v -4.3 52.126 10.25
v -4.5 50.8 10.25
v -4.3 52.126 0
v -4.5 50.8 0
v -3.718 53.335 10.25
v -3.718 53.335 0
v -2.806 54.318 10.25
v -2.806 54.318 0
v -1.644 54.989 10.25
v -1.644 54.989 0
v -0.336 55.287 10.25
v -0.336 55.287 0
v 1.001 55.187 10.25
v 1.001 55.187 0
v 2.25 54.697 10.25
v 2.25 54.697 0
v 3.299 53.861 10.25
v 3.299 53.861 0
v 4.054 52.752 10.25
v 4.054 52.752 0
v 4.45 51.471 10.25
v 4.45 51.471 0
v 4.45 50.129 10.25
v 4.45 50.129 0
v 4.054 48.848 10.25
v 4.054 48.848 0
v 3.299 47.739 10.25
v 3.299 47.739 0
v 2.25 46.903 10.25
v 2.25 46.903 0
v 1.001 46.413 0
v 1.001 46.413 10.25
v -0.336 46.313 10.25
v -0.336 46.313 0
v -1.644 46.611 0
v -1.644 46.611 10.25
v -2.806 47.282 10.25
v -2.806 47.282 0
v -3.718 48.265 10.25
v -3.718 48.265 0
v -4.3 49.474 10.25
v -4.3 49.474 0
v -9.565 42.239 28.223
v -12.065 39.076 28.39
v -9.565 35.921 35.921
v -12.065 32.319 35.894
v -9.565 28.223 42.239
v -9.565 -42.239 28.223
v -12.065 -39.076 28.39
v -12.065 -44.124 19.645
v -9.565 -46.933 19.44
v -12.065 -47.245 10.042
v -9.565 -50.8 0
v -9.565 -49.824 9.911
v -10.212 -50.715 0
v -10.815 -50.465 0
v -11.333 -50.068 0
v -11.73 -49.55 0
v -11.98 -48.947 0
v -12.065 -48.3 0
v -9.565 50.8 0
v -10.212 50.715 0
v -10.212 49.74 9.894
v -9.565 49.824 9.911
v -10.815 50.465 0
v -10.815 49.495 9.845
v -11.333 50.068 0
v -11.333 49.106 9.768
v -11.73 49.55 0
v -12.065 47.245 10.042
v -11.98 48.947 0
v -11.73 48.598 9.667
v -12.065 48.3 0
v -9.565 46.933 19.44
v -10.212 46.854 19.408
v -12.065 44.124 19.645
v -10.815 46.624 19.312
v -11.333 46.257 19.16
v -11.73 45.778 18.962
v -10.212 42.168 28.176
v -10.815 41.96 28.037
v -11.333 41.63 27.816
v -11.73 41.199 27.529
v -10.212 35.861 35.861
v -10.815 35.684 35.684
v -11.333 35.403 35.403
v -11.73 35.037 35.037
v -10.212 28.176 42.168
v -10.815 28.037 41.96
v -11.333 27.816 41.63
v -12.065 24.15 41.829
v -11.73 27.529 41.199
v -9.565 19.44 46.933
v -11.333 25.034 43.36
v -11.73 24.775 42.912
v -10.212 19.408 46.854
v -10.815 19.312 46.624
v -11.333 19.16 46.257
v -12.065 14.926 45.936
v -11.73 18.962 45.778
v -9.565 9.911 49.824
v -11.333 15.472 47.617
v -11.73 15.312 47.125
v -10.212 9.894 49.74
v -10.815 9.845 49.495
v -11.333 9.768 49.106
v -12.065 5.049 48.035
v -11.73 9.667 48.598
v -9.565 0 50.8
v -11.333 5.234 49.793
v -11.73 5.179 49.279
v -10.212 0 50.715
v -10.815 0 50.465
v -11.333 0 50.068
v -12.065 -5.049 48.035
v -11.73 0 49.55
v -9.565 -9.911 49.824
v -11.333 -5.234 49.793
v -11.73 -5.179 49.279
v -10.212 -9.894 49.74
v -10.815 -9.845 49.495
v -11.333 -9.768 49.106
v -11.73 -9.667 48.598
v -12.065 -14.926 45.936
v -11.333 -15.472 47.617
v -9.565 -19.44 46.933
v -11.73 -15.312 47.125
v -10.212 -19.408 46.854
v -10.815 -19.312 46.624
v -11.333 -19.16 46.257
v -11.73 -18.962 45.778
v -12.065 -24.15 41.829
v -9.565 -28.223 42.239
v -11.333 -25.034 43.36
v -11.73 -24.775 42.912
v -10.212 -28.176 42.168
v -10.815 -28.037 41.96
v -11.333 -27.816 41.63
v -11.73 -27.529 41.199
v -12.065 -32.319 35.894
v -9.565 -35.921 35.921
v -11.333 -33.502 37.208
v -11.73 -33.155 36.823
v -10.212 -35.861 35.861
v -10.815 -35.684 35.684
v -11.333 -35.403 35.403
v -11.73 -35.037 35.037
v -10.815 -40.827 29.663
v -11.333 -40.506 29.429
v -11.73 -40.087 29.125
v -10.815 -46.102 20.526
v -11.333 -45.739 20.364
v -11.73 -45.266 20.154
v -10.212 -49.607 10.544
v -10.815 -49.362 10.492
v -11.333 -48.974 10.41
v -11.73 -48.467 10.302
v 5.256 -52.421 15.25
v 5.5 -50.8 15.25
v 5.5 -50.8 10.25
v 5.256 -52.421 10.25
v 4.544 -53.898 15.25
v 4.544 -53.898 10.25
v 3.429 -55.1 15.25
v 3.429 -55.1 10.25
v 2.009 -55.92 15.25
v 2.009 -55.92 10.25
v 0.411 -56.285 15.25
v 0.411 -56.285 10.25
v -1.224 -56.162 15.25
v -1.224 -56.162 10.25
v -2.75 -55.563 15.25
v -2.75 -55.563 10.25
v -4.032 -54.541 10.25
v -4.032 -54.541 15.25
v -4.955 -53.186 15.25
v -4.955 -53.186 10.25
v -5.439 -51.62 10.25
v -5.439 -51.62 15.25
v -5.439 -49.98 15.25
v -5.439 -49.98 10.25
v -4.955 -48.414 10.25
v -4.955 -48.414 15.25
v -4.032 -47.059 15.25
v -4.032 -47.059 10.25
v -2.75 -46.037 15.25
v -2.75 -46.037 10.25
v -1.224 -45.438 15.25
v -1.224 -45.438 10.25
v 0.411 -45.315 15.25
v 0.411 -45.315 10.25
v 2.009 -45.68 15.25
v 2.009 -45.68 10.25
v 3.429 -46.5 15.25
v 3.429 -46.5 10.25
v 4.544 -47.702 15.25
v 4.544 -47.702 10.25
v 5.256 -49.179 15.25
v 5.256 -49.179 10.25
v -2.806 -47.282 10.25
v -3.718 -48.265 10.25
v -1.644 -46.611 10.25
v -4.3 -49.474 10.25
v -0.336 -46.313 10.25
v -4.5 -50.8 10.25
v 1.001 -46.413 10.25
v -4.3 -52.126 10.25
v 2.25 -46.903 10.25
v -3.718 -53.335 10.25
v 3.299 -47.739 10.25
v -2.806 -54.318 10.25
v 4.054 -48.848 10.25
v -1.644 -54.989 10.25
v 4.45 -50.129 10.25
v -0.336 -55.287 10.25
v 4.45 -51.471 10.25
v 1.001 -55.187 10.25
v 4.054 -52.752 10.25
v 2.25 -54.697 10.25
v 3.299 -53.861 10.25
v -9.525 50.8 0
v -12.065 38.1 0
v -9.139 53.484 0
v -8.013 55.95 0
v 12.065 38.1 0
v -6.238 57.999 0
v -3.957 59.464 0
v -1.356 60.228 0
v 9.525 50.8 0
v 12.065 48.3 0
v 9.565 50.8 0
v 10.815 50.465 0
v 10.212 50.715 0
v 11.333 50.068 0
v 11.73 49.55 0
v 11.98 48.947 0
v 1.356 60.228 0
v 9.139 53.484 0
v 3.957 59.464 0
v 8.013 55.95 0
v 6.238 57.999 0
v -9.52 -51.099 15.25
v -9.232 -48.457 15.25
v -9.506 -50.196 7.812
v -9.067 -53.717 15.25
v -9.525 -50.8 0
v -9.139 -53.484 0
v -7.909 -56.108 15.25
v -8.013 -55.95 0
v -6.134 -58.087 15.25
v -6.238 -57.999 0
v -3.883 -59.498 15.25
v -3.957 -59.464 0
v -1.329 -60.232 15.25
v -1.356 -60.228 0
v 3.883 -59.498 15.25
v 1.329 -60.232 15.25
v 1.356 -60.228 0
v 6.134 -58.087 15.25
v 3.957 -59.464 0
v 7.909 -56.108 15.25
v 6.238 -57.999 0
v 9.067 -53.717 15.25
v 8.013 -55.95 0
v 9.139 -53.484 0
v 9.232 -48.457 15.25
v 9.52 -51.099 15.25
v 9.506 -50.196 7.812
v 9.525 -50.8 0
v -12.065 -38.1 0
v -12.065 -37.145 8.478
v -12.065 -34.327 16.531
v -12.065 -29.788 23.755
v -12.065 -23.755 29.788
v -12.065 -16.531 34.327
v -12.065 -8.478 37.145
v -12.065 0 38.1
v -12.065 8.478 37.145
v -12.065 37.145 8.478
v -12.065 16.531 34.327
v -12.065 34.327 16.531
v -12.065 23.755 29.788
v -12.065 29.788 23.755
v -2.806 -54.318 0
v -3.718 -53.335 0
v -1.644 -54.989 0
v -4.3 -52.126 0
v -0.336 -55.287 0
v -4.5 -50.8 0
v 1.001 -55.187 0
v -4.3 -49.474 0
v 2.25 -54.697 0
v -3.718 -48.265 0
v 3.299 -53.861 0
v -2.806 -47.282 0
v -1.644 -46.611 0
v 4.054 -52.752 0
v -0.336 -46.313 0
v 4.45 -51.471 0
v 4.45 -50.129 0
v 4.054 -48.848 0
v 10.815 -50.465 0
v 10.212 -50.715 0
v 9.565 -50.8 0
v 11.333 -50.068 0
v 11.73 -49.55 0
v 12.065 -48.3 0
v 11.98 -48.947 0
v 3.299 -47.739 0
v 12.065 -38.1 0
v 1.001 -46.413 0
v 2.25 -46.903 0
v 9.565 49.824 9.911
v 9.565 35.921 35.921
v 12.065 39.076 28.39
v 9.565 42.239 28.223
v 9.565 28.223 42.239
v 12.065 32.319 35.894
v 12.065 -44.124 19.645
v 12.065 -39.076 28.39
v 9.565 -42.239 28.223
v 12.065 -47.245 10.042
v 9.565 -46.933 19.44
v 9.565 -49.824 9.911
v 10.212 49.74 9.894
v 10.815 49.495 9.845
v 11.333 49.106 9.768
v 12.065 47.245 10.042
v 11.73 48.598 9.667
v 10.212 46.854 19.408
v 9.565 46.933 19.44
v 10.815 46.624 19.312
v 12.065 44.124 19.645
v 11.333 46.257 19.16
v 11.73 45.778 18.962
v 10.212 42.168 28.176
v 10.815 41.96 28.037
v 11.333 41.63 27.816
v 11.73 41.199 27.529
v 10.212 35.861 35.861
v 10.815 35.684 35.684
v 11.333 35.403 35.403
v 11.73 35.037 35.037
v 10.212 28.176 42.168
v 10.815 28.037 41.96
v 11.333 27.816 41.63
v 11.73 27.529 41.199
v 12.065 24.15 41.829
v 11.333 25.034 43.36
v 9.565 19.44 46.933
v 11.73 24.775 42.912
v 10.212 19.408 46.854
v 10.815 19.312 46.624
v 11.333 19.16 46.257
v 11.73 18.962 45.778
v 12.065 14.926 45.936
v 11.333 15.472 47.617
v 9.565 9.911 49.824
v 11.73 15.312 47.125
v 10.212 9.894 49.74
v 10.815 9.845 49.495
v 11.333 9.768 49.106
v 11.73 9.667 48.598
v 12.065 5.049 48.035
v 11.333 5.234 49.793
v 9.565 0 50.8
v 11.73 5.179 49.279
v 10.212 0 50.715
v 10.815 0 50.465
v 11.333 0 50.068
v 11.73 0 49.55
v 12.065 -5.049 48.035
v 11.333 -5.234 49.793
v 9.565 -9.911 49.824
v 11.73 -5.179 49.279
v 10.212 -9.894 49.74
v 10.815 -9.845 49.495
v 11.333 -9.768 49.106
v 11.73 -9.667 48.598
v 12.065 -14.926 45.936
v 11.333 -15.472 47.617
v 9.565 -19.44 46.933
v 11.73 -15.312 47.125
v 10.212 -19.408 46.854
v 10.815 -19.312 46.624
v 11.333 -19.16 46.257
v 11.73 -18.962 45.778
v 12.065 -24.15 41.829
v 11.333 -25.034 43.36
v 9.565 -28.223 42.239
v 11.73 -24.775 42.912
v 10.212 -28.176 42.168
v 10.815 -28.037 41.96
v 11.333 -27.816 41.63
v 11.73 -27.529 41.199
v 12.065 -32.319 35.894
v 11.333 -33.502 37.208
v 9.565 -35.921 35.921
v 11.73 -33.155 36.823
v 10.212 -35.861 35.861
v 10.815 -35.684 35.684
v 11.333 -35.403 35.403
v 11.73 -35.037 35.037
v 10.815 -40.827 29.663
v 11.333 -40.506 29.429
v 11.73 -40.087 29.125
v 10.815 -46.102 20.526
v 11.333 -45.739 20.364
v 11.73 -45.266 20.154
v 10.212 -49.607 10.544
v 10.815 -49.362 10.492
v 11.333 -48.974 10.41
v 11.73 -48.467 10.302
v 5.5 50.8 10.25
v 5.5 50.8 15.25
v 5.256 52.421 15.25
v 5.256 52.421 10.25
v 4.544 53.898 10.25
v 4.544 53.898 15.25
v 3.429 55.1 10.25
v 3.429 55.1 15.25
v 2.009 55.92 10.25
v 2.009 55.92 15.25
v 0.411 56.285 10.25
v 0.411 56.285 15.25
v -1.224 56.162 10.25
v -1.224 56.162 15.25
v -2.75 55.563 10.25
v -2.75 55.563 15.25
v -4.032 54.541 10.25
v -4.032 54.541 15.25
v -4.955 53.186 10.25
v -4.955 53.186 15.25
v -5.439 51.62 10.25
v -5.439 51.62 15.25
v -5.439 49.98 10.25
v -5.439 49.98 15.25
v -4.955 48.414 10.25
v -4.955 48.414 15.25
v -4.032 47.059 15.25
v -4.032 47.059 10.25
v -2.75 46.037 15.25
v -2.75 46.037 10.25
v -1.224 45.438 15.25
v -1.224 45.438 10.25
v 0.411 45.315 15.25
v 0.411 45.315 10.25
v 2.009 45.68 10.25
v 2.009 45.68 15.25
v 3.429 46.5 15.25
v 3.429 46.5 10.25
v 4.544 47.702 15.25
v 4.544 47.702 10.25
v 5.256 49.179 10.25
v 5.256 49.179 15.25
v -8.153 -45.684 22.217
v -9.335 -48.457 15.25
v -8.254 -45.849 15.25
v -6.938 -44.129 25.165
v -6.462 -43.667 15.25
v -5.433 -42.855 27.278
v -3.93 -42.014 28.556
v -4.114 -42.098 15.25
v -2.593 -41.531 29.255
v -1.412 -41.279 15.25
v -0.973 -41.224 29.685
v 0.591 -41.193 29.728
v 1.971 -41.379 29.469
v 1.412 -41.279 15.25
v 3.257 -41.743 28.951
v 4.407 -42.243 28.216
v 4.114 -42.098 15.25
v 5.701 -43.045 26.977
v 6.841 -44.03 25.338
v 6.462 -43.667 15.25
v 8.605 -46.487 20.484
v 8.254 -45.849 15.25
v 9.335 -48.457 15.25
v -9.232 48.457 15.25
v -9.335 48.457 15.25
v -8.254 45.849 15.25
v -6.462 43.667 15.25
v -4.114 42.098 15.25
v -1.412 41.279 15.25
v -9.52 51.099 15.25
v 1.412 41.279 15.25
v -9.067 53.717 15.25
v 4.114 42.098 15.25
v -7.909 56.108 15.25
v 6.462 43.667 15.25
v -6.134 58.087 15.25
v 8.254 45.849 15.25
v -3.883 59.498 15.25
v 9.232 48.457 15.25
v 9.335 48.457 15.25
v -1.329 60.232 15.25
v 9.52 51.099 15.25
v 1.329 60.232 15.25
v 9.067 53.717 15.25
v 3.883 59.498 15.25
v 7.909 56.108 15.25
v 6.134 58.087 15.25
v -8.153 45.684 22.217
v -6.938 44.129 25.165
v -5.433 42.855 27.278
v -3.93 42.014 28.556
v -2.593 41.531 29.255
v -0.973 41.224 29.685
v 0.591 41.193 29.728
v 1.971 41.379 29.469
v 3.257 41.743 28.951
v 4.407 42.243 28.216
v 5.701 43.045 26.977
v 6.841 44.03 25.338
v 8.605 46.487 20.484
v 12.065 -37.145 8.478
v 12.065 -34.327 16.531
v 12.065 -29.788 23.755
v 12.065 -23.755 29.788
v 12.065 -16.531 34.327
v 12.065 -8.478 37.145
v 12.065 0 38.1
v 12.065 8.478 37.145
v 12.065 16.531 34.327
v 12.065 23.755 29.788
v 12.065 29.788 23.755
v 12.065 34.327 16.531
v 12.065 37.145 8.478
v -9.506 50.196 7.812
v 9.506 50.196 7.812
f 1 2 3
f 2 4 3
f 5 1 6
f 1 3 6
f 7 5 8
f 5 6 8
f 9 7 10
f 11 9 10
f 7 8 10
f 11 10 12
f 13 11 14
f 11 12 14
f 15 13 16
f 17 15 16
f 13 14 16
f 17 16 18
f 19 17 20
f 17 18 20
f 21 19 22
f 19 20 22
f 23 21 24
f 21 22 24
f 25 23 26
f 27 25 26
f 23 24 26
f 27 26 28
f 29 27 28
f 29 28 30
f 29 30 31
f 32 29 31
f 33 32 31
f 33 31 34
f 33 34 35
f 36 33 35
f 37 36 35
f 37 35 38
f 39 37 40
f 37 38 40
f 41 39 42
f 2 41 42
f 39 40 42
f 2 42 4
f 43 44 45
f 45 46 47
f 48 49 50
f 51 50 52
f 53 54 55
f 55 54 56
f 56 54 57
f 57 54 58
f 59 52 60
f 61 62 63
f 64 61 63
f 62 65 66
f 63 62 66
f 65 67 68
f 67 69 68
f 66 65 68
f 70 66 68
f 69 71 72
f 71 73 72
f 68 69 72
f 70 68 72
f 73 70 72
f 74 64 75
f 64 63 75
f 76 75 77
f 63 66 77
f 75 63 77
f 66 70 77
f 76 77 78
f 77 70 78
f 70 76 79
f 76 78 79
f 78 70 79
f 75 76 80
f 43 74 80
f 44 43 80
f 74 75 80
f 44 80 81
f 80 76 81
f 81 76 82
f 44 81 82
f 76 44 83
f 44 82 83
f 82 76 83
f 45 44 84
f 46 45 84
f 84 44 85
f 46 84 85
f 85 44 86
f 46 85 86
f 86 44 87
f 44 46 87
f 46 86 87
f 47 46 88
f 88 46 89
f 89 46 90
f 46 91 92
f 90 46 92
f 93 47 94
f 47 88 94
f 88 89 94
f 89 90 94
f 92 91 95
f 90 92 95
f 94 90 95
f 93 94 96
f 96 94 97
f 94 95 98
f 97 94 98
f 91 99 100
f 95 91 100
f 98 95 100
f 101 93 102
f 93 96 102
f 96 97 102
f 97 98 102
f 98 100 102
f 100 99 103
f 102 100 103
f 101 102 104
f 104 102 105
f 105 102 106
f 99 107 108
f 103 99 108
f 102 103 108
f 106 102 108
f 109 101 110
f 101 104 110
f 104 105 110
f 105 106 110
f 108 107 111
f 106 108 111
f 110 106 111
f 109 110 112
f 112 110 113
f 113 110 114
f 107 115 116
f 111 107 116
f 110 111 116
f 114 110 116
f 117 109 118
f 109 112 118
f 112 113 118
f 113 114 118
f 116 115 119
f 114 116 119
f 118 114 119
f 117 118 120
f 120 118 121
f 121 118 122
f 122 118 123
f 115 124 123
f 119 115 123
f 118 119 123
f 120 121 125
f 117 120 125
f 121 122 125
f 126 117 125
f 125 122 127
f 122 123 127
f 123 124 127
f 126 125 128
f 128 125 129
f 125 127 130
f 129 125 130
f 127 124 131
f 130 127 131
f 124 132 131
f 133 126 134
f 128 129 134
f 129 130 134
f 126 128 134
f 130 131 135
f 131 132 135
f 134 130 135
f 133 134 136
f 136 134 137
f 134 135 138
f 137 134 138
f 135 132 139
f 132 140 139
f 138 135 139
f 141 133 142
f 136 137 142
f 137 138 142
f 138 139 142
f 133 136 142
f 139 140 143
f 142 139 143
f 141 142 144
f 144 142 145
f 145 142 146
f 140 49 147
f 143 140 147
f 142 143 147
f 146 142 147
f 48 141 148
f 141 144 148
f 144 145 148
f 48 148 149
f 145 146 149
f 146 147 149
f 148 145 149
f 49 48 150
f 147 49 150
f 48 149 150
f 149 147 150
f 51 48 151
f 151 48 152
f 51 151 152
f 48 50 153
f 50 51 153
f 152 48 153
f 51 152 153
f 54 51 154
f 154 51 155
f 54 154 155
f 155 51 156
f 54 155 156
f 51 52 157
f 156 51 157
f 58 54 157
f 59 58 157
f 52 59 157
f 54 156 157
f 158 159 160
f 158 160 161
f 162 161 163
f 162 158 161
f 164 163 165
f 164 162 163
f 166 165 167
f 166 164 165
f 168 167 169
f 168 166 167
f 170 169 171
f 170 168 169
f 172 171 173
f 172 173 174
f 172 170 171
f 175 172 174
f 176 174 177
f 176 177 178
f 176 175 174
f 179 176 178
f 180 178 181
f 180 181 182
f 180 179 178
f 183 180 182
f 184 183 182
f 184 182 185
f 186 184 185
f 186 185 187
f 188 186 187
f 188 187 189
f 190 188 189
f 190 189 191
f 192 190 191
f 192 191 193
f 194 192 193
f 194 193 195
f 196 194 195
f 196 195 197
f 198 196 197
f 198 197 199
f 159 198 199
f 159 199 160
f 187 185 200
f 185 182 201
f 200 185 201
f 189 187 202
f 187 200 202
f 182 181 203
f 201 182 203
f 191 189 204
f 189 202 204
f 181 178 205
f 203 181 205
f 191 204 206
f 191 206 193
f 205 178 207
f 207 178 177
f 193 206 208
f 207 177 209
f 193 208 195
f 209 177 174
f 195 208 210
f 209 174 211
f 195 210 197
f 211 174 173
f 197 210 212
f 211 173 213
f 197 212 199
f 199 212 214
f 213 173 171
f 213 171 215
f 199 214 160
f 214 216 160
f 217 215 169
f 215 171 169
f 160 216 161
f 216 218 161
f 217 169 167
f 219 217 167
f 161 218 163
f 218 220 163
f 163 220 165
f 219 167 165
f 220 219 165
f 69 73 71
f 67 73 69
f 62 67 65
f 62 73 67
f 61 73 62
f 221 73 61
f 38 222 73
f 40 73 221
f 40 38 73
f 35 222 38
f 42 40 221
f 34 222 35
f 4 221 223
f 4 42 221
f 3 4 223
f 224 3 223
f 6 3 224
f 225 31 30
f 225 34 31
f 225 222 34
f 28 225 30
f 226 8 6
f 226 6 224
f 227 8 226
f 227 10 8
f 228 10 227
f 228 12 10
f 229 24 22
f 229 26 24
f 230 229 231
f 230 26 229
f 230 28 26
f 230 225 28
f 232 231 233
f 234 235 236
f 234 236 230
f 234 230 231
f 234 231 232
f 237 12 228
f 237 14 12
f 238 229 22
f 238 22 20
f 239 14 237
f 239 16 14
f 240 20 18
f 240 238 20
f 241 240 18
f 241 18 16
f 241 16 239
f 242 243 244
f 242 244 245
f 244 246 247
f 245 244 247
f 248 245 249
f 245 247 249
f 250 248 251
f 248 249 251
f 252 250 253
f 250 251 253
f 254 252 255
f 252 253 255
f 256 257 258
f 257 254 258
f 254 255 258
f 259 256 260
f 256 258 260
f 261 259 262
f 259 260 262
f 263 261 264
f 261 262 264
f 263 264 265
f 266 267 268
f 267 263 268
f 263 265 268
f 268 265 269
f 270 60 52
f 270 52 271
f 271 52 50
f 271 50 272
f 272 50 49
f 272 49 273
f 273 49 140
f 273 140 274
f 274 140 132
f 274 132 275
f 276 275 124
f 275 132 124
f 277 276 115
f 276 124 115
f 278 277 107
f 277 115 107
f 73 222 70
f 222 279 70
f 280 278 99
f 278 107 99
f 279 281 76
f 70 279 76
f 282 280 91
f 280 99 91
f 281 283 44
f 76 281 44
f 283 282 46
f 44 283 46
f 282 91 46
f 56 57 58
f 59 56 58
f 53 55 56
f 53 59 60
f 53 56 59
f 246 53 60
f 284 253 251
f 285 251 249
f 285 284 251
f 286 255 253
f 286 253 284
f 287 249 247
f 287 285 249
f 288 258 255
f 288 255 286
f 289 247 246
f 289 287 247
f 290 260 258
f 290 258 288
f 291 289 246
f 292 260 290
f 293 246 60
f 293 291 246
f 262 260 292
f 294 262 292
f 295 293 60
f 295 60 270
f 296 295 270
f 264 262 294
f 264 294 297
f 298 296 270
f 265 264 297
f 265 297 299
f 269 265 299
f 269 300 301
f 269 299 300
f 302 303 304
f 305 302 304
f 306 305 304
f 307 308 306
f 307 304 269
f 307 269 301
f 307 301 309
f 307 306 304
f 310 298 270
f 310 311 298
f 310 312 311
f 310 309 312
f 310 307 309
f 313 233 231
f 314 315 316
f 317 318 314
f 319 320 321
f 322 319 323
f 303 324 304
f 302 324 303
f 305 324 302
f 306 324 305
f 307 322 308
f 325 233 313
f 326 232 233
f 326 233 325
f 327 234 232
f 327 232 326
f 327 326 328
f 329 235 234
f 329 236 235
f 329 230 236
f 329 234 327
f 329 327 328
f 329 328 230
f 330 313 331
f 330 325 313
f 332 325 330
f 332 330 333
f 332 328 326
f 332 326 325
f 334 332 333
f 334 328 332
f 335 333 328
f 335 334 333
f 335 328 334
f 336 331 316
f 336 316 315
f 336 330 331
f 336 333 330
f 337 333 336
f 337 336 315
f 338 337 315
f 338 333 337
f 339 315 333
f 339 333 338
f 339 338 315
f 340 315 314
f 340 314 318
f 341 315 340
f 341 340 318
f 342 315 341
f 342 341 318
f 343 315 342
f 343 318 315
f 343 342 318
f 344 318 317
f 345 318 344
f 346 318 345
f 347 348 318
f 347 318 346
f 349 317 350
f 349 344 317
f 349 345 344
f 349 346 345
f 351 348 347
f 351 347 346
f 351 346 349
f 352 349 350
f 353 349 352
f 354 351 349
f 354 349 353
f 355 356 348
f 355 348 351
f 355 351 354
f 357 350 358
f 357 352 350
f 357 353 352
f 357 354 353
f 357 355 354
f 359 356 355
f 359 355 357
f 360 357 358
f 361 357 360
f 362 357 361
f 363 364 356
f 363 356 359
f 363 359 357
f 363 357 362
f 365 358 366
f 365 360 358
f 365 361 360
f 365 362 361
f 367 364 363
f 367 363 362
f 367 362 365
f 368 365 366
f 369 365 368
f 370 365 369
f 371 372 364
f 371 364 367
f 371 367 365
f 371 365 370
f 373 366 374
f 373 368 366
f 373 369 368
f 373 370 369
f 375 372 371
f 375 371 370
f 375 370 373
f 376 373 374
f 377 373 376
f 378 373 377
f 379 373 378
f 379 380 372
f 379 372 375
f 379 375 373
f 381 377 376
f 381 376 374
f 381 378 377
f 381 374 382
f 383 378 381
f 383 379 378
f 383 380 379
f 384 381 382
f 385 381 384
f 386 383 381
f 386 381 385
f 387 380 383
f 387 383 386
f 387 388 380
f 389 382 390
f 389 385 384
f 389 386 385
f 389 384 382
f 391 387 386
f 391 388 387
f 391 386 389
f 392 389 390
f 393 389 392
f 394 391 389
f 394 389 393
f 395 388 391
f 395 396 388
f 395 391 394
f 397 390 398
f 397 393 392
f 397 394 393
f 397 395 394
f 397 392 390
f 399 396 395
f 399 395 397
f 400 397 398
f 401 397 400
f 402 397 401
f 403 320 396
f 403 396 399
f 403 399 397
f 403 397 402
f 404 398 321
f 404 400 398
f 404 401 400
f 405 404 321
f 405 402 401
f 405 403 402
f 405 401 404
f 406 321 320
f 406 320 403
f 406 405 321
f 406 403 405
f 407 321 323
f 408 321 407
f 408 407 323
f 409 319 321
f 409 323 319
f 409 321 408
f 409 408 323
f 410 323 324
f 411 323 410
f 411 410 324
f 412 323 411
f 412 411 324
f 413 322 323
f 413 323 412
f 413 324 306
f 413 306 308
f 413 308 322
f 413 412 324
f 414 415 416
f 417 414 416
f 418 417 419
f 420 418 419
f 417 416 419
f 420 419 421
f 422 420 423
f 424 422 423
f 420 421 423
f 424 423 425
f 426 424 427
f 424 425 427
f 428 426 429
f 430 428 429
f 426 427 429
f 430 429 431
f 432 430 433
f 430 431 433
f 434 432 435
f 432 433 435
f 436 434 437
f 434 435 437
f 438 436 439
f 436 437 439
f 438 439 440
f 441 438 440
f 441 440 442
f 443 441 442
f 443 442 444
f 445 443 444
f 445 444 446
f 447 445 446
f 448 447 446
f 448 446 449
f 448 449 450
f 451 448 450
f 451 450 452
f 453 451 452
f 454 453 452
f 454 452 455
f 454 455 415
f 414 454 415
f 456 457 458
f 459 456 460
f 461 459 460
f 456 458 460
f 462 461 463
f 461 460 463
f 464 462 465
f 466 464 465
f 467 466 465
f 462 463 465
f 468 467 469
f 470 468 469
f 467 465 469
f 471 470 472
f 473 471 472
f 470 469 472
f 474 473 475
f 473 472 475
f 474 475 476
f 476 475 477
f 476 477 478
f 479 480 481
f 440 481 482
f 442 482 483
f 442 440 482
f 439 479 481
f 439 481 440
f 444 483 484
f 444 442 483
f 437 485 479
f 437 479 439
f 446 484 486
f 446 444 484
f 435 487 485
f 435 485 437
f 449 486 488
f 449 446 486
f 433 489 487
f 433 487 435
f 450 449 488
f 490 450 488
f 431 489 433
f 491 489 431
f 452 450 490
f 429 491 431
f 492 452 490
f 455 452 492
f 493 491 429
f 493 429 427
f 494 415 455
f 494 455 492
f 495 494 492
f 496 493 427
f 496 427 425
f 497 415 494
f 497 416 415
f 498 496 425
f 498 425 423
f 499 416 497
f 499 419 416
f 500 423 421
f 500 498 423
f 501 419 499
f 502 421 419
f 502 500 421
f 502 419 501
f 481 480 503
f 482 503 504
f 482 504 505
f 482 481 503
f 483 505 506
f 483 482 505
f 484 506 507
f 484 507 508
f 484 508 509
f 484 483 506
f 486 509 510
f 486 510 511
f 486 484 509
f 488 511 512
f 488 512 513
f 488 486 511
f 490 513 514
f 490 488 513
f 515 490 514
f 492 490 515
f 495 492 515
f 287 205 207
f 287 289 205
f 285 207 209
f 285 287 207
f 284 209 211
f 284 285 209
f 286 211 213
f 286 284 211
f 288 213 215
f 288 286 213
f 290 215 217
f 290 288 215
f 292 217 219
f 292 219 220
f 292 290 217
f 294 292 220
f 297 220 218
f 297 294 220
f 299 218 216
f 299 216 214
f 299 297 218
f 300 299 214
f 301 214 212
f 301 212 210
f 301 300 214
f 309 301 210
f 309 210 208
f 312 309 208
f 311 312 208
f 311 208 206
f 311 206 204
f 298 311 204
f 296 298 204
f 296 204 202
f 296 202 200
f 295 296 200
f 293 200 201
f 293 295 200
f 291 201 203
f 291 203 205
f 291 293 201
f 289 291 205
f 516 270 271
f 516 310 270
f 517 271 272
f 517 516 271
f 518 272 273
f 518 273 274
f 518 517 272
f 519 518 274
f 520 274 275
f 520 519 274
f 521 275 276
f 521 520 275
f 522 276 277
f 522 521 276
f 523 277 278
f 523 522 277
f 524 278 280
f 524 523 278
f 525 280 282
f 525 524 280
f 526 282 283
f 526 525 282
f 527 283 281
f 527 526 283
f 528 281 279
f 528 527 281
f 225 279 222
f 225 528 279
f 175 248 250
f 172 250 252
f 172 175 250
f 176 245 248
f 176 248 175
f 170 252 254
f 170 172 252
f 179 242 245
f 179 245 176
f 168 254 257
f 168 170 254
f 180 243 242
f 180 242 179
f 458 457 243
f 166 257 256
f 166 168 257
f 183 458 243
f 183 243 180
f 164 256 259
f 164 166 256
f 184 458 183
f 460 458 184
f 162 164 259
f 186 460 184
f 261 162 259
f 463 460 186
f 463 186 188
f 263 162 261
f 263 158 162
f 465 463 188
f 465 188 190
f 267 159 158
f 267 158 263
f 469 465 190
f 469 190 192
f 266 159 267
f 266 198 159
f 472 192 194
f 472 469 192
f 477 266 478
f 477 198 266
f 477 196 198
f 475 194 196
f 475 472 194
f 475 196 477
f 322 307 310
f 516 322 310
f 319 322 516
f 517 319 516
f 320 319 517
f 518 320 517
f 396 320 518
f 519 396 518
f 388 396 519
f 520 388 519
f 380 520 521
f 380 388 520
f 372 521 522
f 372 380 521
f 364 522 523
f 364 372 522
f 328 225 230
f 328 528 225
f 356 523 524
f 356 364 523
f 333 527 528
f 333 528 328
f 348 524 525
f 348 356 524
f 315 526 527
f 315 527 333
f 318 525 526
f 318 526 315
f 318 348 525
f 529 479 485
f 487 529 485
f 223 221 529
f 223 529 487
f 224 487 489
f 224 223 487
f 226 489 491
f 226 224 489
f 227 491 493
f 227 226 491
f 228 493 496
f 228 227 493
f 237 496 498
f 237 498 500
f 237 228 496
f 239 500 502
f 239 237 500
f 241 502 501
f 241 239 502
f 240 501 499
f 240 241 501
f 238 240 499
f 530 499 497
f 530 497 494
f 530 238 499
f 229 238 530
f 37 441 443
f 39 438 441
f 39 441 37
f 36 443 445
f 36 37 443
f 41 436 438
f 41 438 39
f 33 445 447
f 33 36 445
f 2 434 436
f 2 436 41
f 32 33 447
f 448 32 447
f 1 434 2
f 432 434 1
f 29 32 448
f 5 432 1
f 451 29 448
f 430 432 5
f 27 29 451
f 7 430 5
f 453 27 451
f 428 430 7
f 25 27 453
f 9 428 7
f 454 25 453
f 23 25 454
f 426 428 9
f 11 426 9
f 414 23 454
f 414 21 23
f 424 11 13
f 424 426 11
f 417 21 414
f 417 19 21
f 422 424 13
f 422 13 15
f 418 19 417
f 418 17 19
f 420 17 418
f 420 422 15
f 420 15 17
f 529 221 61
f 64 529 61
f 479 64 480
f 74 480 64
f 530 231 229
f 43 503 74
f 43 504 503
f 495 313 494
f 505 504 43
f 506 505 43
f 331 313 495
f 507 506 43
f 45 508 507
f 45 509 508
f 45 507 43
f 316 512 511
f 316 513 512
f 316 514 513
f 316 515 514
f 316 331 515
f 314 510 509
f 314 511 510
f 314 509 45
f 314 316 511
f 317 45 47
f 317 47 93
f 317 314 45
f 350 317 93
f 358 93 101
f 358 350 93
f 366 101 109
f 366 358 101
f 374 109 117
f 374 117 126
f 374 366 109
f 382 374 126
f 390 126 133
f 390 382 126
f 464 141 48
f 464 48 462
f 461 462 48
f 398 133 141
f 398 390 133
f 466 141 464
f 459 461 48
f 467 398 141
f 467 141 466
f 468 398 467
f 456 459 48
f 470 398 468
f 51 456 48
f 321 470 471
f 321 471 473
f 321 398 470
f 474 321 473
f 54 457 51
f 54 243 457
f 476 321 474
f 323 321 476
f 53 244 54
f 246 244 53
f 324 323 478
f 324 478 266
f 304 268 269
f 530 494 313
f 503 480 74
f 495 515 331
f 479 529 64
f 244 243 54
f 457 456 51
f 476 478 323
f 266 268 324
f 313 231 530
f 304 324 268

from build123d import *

# Parameters (mm, degrees)
F1_DEPTH       = 12.065
F2_R           = 9.525
F3_DEPTH       = 15.25
F4_R           = 9.625
F5_DEPTH       = 25
F7_D           = 9
F7_DEPTH       = 75
F7_CBORE_D     = 11
F7_CBORE_DEPTH = 5
F7_TIP         = 2.7038727856
F8_R           = 2.5


# Not quite as in the source:
# - a pattern or mirror of a feature is missing from the dataset's text; its kind, count and spacing are read off the source's solid


with BuildPart() as f1:
    # F0 (on Right) → F1 (new body, symmetric)
    with BuildSketch(Plane.YZ):
        with BuildLine():
            ThreePointArc((-38.1, 0), (0, 38.1), (38.1, 0))
            Line((38.1, 0), (50.8, 0))
            ThreePointArc((50.8, 0), (0, 50.8), (-50.8, 0))
            Line((-50.8, 0), (-38.1, 0))
        make_face()
    extrude(amount=F1_DEPTH, both=True)

    # F2 (on face) → F3 (join)
    with BuildSketch(Plane(origin=(0, 0, 0), x_dir=(1, 0, 0), z_dir=(0, 0, -1))):
        with Locations((0, -50.8)):
            Circle(F2_R)
    f3 = extrude(amount=-F3_DEPTH)

    # F3_copies: F3 across plane
    add(f3.mirror(Plane(origin=(0, 0, 0), x_dir=(0, 0, -1), z_dir=(0, -1, 0))))

    # F4 (on face) → F5 (cut)
    with BuildSketch(Plane.XY.offset(15.25)):
        with Locations((0, 50.8)):
            Circle(F4_R)
    f5 = extrude(amount=F5_DEPTH, mode=Mode.SUBTRACT)

    # F5_copies: F5 across plane
    add(f5.mirror(Plane(origin=(0, -4e-06, 0), x_dir=(0, 0, -1), z_dir=(0, -1, 0))), mode=Mode.SUBTRACT)

    # F7
    with Locations(Plane.XY.offset(15.25)):
        with Locations((0, 50.8)):
            f7 = CounterBoreHole(F7_D / 2, F7_CBORE_D / 2, F7_CBORE_DEPTH, depth=F7_DEPTH)
            with Locations((0, 0, -(F7_DEPTH + F7_TIP / 2))):  # 118° drill point
                Cone(0, F7_D / 2, F7_TIP, mode=Mode.SUBTRACT)

    # F7_copies: F7 across plane
    add(f7.mirror(Plane(origin=(0, 0, 0), x_dir=(0, 0, -1), z_dir=(0, -1, 0))), mode=Mode.SUBTRACT)

    # F8
    f8_edges = [f1.edges().sort_by_distance(p)[0] for p in [
        (12.065, 0, 50.8),
        (-12.065, 0, 50.8),
    ]]
    fillet(f8_edges, radius=F8_R)


solid = f1.part
